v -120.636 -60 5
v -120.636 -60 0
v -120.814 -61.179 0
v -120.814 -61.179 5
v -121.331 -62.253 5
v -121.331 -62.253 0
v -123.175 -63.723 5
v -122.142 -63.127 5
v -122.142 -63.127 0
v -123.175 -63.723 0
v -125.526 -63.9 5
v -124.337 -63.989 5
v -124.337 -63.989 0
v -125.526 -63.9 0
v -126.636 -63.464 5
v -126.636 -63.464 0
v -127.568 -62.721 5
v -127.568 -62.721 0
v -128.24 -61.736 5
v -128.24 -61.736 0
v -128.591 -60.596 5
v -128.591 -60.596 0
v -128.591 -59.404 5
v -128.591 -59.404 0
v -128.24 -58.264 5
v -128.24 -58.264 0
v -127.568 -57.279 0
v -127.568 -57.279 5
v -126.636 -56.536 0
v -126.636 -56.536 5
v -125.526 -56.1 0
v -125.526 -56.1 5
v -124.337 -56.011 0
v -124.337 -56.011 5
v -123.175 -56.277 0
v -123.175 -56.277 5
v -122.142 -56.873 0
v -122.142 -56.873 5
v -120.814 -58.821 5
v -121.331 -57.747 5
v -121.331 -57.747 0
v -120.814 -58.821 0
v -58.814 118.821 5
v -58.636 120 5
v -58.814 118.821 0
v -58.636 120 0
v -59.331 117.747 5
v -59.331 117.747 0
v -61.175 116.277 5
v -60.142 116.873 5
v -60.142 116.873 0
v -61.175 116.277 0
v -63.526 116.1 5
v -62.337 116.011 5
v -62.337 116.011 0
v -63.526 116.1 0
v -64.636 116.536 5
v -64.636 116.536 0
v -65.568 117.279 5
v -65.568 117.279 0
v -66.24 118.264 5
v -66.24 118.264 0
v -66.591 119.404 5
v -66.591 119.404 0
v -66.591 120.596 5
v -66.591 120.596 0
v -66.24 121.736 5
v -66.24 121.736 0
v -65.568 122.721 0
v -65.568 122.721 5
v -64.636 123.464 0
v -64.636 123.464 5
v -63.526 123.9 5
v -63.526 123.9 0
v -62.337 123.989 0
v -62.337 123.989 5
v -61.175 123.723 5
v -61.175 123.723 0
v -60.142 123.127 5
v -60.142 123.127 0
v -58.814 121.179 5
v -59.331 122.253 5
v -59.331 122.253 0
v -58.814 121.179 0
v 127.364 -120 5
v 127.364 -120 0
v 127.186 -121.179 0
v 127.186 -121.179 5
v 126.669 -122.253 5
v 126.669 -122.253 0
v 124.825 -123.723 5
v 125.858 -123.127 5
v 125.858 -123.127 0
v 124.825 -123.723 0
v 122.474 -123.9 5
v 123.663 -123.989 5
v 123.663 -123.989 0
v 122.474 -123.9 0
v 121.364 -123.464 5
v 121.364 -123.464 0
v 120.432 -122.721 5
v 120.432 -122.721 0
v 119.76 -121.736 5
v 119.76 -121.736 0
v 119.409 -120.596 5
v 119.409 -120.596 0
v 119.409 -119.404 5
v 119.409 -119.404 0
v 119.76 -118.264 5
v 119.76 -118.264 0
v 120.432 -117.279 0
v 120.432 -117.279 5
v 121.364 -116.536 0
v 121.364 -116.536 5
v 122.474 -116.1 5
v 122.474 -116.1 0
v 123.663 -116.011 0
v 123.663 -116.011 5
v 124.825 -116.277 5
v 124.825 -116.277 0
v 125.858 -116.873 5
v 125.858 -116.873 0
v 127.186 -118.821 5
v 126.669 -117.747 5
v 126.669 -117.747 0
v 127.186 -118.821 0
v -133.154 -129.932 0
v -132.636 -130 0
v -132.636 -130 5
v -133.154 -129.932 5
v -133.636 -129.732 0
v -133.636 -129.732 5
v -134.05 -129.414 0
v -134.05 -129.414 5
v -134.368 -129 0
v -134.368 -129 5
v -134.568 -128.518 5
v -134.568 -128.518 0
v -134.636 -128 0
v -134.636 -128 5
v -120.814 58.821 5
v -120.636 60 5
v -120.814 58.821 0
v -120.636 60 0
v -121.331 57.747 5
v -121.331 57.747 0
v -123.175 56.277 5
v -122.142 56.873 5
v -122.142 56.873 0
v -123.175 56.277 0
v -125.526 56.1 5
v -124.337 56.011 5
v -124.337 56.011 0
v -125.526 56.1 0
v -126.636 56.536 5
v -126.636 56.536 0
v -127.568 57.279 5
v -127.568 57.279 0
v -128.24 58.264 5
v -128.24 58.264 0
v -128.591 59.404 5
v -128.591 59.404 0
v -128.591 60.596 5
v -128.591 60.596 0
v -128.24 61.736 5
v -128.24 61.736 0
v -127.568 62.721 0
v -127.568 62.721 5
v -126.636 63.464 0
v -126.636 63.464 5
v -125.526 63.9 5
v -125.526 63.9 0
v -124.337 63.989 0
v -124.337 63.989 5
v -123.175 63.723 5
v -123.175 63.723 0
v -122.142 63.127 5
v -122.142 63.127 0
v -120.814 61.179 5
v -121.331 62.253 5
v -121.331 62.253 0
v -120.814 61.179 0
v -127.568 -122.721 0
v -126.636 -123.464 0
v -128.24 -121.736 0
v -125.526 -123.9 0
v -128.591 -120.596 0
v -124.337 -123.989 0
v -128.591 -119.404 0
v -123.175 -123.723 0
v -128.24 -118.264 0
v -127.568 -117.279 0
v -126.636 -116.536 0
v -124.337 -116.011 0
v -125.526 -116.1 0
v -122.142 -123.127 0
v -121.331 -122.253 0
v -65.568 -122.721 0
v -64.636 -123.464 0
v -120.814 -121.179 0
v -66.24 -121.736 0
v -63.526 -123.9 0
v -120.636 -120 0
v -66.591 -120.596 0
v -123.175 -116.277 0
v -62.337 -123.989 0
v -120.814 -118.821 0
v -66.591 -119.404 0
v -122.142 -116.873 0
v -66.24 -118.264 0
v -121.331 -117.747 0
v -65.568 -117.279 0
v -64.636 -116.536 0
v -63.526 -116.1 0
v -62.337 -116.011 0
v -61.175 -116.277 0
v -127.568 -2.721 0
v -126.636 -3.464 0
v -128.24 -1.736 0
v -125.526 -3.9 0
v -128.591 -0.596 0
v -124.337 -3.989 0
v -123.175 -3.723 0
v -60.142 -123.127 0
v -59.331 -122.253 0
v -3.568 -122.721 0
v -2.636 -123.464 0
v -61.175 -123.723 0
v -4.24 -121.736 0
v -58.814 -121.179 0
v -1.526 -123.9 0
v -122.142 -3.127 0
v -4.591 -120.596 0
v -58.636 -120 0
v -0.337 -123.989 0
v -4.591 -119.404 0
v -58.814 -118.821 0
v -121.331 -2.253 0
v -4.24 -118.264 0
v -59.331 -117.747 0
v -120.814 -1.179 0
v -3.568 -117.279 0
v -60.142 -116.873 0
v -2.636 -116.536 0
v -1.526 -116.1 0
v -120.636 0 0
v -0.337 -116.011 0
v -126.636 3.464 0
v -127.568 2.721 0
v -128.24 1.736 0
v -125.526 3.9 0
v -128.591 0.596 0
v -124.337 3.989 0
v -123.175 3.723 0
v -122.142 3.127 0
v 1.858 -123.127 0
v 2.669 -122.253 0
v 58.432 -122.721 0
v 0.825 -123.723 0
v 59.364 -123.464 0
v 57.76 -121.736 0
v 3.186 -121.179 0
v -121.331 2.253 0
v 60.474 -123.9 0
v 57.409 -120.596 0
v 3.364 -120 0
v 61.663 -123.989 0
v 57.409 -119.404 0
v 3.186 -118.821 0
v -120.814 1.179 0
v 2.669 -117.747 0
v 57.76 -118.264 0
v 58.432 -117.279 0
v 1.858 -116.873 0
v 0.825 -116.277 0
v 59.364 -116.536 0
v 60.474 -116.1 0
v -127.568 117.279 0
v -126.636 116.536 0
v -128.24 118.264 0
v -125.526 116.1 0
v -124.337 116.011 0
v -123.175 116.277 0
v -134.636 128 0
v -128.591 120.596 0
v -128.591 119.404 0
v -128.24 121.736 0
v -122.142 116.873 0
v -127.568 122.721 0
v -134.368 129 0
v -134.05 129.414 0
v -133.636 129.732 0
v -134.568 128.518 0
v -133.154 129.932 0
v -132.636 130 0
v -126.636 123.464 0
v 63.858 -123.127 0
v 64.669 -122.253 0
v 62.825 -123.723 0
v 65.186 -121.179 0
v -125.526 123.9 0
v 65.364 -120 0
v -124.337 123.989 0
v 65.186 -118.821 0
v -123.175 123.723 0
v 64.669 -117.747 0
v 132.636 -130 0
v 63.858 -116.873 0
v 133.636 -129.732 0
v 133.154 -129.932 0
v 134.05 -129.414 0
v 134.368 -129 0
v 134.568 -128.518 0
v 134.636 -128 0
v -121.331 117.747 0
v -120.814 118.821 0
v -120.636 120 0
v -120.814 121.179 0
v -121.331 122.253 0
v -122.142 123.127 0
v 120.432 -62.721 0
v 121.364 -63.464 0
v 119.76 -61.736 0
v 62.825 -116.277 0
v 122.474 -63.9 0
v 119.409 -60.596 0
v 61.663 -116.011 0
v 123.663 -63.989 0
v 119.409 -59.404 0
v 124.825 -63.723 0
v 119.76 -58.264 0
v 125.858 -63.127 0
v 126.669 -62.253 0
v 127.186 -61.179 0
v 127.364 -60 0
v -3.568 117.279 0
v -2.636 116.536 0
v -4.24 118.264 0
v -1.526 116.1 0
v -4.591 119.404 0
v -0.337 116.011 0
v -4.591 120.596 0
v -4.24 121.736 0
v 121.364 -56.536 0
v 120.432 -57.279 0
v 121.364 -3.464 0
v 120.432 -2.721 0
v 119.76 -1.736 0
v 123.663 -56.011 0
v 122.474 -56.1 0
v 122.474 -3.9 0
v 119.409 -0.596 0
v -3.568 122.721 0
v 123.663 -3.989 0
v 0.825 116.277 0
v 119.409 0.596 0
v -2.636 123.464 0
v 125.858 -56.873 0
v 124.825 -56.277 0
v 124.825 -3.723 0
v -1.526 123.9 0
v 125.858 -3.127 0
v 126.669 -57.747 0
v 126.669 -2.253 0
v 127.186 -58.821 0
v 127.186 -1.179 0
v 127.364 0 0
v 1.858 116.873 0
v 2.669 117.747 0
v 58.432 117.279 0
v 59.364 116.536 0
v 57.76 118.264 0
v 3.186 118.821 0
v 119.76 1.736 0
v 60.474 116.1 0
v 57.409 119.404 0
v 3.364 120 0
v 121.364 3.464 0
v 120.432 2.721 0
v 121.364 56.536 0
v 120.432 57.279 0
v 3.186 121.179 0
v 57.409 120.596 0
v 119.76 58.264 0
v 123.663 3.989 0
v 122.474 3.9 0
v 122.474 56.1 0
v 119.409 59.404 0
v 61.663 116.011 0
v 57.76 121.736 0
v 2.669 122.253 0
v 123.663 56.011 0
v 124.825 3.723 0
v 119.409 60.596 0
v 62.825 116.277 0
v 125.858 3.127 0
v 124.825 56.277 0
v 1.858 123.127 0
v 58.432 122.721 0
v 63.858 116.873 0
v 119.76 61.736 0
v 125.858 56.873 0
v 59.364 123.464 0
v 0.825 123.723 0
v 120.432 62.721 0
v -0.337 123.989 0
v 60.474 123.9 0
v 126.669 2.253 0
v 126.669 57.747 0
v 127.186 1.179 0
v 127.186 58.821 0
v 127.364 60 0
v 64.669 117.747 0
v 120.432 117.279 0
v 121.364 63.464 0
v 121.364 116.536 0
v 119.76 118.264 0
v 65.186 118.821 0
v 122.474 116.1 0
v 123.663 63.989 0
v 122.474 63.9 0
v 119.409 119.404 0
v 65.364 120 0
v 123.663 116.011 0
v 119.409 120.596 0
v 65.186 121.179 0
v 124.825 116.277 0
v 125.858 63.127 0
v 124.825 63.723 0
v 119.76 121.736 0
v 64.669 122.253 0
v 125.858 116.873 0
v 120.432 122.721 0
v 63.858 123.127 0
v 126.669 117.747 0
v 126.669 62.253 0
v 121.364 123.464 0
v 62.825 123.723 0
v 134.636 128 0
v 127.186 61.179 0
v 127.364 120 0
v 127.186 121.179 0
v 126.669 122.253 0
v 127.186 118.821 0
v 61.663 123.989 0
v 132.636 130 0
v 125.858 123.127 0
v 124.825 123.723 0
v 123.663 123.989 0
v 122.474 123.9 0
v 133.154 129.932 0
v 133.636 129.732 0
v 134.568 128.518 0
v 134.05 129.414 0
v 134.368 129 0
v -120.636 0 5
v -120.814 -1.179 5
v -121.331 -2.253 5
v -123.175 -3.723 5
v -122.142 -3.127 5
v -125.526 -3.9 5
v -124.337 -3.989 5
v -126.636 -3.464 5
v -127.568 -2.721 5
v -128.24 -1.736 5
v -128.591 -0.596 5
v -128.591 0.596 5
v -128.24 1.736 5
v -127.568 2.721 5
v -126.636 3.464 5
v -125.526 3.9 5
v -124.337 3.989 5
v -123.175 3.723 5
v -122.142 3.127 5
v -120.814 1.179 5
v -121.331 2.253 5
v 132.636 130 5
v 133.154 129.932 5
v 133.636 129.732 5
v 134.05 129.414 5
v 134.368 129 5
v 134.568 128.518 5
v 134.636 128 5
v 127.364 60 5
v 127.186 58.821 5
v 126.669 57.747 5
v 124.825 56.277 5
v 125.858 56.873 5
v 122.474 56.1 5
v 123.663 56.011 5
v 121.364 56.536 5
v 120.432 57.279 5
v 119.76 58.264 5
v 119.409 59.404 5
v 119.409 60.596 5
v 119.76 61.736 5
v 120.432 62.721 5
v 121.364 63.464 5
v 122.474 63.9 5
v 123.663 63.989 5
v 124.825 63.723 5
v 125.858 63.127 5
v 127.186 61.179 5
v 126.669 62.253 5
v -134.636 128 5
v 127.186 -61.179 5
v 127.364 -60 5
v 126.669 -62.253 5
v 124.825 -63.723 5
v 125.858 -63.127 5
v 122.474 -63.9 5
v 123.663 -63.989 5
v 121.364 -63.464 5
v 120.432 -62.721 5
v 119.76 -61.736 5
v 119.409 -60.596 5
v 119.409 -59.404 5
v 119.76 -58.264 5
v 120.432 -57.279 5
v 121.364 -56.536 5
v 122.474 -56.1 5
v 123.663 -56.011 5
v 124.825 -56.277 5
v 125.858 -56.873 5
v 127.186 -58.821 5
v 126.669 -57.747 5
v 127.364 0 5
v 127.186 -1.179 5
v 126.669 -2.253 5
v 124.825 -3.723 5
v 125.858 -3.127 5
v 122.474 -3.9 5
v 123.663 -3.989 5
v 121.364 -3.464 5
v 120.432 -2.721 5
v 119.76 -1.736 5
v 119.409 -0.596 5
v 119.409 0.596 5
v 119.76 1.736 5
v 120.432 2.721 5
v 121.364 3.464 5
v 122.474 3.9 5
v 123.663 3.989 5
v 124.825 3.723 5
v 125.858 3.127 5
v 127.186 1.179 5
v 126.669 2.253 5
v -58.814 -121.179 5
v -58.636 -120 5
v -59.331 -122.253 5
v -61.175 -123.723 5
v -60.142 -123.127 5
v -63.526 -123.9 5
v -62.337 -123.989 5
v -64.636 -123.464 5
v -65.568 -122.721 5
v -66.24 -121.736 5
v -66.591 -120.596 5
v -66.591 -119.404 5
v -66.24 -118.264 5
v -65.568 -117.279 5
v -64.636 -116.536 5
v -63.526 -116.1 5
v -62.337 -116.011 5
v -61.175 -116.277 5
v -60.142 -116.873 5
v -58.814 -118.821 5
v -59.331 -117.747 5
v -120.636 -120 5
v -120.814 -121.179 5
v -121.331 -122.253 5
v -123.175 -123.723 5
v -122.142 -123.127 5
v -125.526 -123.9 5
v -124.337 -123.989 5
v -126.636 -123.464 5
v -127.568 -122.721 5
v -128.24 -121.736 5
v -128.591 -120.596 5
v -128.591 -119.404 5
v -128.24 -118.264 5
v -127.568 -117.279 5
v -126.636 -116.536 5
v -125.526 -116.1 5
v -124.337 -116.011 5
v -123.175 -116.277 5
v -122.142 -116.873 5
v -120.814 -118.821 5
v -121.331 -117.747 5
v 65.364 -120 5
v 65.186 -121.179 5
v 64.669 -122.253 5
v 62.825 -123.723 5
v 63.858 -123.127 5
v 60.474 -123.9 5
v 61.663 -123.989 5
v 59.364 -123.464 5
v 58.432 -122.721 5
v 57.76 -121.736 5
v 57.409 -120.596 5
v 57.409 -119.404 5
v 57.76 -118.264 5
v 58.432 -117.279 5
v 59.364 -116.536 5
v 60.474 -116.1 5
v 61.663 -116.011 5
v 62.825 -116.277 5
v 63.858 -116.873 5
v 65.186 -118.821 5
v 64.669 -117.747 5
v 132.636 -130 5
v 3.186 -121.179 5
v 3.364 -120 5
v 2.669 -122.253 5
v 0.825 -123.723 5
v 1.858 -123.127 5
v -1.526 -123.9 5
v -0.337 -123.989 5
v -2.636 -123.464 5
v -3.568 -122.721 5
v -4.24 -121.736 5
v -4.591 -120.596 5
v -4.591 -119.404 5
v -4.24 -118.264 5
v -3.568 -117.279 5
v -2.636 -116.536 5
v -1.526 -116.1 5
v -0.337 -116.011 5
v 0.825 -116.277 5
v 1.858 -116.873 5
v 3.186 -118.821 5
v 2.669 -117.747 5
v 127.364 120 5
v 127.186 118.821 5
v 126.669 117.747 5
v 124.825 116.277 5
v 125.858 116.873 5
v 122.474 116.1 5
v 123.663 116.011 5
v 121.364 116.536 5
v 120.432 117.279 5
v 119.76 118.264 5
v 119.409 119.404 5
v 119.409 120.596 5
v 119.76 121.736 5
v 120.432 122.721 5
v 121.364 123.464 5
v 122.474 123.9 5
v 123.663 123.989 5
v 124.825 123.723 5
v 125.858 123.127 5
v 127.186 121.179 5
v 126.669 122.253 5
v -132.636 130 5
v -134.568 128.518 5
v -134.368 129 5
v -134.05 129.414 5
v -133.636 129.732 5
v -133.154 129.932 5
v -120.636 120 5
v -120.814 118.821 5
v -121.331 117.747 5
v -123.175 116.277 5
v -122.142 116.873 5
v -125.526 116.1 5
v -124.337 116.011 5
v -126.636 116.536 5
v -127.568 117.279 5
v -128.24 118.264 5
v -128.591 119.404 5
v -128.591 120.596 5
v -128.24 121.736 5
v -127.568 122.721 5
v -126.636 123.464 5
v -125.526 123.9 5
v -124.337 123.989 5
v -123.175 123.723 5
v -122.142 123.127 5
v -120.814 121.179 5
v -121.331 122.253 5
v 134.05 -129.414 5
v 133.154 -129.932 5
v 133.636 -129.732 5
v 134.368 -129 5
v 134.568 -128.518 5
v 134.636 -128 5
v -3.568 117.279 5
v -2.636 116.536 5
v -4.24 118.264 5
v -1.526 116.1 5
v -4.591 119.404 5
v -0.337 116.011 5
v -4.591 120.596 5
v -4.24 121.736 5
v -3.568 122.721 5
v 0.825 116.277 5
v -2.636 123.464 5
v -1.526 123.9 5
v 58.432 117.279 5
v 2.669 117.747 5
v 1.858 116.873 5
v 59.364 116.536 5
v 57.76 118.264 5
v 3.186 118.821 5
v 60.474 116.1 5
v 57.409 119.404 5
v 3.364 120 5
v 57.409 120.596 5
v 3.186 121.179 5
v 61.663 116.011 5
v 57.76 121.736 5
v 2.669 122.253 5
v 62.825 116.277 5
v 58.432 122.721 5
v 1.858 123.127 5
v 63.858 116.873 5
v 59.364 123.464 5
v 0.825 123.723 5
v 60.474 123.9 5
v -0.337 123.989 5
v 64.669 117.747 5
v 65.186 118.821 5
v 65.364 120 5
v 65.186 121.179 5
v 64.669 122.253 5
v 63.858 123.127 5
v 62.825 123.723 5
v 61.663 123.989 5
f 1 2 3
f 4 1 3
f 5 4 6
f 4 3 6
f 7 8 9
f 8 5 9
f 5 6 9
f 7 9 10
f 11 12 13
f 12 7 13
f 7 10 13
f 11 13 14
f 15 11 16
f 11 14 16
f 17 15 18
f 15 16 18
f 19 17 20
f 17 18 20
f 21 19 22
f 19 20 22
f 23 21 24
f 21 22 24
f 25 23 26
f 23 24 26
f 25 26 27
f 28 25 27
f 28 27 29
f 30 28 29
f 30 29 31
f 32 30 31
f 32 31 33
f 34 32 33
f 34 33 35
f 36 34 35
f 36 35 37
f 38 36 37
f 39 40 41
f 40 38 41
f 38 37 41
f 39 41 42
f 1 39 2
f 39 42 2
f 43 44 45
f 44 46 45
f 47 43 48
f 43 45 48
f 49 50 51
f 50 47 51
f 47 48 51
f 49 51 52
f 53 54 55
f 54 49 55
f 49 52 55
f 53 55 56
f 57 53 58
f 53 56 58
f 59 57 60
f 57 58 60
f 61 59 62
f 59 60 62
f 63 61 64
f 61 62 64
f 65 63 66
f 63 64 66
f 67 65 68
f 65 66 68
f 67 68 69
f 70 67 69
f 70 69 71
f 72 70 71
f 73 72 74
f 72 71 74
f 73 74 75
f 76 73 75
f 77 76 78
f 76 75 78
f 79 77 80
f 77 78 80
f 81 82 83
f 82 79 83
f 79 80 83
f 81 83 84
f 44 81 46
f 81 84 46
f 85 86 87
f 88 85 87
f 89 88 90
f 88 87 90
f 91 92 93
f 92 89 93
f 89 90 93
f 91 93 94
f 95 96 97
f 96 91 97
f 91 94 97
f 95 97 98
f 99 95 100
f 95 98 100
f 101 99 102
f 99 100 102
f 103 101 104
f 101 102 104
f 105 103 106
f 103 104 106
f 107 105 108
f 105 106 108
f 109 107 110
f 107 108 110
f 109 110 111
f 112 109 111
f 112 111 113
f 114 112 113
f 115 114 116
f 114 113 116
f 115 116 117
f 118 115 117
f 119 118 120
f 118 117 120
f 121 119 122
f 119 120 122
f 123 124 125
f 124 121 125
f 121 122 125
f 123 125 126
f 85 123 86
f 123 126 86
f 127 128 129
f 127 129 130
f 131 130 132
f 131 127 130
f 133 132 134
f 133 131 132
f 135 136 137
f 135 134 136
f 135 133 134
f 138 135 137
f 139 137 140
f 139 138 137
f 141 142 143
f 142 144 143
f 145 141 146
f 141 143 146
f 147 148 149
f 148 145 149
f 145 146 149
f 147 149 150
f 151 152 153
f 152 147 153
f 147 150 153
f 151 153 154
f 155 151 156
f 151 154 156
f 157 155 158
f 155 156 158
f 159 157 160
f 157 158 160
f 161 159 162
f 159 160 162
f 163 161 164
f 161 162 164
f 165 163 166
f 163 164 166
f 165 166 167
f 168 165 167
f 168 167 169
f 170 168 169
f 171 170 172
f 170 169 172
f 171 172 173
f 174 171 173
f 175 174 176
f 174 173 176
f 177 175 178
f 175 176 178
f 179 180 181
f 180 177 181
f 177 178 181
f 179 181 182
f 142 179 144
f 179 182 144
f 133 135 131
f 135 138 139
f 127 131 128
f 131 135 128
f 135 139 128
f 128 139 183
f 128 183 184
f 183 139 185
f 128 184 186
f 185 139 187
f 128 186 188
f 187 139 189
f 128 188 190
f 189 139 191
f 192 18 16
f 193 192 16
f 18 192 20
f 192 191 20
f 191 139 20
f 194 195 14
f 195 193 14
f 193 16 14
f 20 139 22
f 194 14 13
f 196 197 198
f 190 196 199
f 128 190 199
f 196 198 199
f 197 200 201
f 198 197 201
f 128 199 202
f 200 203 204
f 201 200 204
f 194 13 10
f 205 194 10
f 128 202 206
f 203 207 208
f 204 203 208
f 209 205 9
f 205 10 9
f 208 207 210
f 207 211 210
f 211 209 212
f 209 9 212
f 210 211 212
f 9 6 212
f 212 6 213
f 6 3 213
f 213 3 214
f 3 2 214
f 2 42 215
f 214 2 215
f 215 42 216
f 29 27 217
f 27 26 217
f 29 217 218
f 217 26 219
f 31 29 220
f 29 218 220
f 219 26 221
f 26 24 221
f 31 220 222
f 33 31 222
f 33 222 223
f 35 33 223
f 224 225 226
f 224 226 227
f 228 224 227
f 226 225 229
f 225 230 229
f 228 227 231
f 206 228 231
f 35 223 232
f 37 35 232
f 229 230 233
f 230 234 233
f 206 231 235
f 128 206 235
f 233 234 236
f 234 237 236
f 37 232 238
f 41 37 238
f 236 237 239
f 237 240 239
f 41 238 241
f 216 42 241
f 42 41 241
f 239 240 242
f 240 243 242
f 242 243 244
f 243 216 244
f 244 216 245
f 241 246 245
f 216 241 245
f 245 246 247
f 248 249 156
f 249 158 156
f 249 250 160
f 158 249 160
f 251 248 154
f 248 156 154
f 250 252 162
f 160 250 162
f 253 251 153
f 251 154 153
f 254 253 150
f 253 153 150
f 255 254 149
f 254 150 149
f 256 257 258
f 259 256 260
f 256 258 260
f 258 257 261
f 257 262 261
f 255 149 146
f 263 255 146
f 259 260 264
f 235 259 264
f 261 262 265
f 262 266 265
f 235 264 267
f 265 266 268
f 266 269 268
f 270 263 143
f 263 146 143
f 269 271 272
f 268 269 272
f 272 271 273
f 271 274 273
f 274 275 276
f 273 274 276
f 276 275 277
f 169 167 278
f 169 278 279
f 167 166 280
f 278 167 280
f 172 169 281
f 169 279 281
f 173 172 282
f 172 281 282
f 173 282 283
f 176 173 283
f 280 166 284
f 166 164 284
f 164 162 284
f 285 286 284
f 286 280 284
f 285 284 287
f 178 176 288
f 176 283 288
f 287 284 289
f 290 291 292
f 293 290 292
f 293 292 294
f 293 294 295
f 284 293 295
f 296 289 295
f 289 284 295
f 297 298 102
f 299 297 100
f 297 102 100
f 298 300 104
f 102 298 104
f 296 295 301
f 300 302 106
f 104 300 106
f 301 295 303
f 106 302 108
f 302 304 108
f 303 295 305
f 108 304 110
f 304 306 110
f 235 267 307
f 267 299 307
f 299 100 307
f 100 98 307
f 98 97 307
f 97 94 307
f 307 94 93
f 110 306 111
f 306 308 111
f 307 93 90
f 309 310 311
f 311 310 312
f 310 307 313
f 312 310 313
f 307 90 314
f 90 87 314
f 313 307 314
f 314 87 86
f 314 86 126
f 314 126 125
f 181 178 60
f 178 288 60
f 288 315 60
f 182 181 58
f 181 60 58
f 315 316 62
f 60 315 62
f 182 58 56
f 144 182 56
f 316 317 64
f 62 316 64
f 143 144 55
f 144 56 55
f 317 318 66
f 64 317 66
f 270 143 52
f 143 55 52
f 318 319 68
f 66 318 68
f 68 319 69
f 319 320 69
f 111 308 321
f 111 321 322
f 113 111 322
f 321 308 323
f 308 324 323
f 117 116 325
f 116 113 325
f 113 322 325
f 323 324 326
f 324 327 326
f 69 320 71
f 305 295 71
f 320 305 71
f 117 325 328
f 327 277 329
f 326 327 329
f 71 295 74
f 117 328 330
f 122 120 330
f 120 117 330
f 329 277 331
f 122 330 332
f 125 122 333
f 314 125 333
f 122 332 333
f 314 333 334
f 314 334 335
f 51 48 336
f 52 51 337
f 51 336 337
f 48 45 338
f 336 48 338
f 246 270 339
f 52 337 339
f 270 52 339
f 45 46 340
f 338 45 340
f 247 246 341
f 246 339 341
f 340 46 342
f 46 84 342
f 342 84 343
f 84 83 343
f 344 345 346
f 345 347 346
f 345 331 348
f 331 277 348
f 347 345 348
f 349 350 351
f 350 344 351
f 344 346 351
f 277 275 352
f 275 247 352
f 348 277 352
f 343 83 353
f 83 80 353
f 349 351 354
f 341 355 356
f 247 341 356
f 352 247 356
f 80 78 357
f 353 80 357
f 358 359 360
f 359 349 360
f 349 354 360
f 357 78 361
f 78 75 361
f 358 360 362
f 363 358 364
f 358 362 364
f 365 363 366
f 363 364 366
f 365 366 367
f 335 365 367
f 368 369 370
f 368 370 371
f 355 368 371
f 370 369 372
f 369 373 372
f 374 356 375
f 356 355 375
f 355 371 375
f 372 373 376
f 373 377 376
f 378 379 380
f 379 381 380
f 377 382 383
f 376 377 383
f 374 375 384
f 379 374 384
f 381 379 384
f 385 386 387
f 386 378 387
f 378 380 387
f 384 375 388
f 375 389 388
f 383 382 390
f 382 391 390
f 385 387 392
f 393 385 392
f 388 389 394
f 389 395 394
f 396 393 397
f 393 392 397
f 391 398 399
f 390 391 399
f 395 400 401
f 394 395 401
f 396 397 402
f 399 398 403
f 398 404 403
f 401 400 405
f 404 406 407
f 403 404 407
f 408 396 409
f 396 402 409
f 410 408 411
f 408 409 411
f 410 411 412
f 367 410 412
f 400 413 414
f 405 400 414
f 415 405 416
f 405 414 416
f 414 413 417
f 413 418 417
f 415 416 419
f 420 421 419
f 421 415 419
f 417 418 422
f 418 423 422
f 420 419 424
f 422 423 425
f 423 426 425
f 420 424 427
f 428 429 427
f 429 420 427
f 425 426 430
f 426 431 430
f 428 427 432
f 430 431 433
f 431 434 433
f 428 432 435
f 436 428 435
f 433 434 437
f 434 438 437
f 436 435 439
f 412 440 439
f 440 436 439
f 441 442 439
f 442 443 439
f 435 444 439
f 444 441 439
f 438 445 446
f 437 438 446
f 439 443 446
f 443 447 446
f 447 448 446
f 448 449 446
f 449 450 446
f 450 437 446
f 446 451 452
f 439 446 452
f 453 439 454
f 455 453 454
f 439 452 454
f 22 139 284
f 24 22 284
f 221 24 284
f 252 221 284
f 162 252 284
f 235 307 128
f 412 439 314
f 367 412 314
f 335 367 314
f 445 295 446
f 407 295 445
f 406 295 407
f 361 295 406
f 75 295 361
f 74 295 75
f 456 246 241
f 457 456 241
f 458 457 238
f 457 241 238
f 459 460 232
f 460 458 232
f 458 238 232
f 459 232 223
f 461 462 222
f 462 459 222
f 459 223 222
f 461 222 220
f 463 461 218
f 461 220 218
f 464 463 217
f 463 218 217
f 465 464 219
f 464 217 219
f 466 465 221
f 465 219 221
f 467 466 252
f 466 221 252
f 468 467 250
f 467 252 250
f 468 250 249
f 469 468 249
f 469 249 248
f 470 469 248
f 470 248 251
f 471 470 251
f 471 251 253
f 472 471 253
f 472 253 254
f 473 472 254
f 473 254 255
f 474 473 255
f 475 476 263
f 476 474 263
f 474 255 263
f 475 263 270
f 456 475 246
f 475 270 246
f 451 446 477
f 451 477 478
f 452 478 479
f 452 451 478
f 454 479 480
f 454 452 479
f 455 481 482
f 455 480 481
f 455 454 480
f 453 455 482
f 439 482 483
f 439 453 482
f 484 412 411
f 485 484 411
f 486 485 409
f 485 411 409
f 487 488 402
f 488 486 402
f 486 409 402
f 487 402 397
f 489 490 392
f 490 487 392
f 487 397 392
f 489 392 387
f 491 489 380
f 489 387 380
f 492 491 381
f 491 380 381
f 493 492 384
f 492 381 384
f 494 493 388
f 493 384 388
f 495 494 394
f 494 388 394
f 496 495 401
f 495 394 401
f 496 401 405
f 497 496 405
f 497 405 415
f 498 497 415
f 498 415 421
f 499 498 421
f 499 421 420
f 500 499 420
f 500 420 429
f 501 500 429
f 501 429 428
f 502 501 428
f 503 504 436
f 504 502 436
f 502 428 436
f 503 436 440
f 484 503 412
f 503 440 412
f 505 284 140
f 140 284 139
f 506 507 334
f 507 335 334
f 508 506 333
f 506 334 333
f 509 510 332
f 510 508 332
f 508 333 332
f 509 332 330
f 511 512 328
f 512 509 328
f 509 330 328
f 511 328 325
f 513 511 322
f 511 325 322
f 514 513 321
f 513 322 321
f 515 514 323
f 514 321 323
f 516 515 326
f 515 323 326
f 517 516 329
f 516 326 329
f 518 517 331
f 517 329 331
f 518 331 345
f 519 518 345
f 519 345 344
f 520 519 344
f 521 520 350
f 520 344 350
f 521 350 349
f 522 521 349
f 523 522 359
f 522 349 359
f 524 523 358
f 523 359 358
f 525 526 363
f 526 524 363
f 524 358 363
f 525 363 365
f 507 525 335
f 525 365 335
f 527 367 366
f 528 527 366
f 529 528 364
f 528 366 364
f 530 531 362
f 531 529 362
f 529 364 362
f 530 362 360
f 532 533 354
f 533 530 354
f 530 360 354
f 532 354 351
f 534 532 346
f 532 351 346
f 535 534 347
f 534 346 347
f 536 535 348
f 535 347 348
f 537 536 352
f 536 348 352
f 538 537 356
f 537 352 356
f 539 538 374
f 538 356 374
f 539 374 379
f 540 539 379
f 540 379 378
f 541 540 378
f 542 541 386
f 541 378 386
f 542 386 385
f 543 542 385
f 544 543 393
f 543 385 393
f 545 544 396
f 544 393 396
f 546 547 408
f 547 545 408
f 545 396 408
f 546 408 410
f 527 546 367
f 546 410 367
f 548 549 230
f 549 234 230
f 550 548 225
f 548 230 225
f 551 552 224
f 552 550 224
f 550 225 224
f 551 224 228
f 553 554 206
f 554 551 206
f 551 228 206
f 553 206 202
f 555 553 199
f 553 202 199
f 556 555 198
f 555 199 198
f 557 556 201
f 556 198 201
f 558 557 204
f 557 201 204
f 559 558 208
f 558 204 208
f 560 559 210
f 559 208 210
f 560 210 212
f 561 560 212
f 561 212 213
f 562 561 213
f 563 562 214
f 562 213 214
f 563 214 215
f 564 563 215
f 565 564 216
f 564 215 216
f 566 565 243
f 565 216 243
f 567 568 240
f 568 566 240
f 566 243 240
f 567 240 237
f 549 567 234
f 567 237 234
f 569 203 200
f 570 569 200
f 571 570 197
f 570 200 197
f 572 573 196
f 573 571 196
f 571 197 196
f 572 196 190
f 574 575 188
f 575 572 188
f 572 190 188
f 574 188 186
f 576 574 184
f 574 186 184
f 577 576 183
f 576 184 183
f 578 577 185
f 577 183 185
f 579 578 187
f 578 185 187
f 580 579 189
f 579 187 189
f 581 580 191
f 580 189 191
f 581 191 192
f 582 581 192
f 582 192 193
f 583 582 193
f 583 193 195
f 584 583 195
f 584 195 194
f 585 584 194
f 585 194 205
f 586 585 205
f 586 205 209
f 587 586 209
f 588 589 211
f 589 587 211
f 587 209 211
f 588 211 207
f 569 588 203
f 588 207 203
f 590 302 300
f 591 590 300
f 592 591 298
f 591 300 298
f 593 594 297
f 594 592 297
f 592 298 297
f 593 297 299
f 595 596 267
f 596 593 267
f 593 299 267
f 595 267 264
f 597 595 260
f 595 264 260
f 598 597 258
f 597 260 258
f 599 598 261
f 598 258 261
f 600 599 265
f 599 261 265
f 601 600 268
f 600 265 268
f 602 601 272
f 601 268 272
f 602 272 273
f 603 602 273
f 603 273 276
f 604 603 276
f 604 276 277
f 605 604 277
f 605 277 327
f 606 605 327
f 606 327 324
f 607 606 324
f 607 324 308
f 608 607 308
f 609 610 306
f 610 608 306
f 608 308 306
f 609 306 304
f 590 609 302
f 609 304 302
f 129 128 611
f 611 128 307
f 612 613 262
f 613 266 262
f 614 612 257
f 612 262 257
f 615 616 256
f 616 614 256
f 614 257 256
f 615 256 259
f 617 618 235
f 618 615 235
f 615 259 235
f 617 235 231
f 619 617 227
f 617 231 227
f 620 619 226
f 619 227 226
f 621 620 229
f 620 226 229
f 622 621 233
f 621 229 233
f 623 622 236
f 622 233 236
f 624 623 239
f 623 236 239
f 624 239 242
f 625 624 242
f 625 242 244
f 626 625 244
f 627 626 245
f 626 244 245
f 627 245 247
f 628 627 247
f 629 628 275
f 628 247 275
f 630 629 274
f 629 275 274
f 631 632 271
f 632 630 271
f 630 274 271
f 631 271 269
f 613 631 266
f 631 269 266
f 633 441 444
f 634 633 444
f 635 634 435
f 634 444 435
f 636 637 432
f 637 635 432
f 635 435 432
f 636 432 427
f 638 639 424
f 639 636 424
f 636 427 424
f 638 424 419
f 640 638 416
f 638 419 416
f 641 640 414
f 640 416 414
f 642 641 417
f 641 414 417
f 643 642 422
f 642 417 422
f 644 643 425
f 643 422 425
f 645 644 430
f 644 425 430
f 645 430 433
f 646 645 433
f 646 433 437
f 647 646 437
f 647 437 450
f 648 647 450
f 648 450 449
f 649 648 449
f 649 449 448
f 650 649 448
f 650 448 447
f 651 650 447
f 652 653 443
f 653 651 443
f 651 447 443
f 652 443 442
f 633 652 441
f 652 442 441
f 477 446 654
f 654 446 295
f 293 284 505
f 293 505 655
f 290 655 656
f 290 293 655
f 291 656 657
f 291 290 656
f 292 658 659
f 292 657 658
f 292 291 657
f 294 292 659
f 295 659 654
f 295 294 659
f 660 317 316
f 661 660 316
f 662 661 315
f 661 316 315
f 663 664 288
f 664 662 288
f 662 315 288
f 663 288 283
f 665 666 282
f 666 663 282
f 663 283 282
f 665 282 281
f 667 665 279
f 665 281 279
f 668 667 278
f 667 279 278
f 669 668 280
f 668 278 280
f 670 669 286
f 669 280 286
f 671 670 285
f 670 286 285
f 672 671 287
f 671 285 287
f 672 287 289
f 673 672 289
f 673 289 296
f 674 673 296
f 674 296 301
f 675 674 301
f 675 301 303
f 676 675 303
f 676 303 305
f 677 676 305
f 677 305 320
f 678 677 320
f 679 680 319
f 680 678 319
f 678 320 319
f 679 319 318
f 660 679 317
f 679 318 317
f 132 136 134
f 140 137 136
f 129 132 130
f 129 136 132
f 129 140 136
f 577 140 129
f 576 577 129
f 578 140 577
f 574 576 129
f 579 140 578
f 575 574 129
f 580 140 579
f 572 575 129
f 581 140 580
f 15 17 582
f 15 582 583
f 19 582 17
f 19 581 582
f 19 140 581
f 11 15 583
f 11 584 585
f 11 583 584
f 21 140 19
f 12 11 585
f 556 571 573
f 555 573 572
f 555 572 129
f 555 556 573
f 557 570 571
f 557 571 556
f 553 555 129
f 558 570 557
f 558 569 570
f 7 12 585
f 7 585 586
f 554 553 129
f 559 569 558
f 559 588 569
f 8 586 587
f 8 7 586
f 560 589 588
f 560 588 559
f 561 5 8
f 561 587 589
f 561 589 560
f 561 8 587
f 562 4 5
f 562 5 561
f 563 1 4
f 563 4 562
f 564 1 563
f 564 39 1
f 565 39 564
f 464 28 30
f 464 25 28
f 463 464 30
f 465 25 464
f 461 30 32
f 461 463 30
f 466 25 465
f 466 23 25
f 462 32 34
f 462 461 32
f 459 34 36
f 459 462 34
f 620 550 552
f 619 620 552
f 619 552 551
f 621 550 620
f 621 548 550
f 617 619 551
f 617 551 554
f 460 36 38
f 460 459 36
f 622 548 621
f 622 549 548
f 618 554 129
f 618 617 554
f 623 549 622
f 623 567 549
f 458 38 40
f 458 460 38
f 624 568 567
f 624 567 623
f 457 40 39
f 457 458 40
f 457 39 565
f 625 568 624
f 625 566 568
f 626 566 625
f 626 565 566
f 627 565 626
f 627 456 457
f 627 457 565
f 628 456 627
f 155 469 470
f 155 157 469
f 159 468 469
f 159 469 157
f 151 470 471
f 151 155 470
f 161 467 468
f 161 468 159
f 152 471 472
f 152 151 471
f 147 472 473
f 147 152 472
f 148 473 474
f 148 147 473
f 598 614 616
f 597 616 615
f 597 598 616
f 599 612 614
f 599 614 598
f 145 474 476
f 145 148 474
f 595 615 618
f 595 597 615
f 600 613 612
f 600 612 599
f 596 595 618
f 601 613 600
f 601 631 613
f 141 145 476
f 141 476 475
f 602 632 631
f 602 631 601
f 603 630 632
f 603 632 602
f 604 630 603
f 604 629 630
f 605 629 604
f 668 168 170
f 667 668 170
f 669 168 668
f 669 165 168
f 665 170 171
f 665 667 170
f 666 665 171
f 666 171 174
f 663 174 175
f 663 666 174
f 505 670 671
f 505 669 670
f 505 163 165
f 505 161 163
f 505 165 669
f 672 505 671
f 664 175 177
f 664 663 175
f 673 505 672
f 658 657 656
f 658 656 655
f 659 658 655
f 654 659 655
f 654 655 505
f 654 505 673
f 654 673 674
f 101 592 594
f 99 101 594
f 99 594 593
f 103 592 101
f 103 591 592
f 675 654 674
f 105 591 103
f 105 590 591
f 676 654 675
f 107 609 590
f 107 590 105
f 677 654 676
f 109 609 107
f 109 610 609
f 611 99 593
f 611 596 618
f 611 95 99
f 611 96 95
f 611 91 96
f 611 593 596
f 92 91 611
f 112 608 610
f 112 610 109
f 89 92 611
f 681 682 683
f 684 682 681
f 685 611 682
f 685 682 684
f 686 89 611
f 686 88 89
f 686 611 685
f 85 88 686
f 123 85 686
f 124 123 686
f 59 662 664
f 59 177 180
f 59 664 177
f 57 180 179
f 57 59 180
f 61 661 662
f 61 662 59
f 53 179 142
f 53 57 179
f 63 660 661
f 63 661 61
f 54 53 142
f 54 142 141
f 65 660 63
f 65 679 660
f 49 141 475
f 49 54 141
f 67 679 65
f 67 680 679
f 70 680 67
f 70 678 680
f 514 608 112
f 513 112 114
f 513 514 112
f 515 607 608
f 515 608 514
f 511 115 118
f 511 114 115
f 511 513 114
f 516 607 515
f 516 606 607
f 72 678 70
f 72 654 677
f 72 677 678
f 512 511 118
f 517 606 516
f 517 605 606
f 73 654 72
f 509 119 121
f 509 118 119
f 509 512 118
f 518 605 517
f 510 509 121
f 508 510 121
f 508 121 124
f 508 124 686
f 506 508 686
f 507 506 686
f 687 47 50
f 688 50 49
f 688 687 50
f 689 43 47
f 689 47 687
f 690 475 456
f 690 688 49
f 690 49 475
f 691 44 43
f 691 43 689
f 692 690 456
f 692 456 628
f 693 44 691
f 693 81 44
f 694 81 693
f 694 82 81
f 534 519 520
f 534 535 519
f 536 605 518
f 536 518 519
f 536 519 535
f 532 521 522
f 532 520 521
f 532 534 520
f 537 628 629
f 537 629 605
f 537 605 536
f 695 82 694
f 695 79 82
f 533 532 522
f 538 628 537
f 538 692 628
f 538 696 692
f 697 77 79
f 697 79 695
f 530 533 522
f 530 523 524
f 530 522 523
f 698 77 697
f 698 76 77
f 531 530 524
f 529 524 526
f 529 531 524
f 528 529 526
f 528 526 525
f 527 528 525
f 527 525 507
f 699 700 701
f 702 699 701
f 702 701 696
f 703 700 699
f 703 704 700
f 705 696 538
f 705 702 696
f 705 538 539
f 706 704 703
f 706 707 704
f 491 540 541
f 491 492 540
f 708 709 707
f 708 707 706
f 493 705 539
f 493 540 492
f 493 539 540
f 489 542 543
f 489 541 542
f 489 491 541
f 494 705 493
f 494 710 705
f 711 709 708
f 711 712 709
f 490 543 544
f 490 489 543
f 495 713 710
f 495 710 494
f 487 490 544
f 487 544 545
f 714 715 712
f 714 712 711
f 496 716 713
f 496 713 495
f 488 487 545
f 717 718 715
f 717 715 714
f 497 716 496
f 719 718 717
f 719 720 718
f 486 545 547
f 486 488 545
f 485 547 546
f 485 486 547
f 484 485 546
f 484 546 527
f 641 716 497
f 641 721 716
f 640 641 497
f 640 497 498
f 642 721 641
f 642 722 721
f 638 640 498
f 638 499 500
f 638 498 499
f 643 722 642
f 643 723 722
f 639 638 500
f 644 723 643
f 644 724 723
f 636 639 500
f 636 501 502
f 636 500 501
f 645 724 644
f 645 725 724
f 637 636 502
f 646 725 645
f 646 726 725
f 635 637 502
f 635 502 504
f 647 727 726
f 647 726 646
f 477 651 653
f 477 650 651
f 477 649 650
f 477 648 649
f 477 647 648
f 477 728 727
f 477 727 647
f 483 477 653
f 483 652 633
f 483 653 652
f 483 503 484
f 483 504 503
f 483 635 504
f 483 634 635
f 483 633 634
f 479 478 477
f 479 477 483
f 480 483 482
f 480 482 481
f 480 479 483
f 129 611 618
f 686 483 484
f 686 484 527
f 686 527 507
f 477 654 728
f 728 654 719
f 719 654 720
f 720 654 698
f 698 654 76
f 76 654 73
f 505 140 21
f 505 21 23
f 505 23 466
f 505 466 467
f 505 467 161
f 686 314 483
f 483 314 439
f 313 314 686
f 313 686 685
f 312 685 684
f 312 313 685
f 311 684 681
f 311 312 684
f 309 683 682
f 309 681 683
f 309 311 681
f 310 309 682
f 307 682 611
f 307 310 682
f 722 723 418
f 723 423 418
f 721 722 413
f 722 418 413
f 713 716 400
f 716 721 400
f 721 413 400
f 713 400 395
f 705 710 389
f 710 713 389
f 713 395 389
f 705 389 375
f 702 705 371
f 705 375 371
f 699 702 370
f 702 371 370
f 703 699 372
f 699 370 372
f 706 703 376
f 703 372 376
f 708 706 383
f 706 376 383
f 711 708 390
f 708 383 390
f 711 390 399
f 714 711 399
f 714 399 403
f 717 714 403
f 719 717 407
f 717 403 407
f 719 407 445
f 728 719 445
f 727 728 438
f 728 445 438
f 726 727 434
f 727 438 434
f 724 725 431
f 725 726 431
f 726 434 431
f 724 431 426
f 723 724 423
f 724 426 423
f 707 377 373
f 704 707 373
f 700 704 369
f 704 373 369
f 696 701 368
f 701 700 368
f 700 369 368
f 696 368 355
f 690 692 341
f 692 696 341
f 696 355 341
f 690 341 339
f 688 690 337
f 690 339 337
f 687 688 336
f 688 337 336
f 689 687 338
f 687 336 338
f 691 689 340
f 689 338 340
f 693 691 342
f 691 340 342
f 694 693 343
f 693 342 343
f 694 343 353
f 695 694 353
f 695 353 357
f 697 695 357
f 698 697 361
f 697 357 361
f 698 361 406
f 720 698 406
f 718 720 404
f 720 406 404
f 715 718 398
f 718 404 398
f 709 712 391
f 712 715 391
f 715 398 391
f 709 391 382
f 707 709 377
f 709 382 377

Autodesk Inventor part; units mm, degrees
ref_plane "YZ Plane" through (0, 0, 0) normal (1, 0, 0) x (0, 1, 0)
ref_plane "XZ Plane" through (0, 0, 0) normal (0, 1, 0) x (-1, 0, 0)
ref_plane "XY Plane" through (0, 0, 0) normal (0, 0, 1) x (1, 0, 0)
ref_plane "РабПлоскость1" through (0, 0, 0) normal (0, 0, 1) x (1, 0, 0)
sketch "Эскиз1" plane through (0, 0, 0) normal (0, 0, 1) x (1, 0, 0)
  line L0 (-134.636, 128) -> (-134.636, -128) projected
  arc A0 (-134.636, -128) -> (-132.636, -130) centre (-132.636, -128) ccw projected
  line L1 (-132.636, -130) -> (132.636, -130) projected
  arc A1 (132.636, -130) -> (134.636, -128) centre (132.636, -128) ccw projected
  line L2 (134.636, -128) -> (134.636, 128) projected
  arc A2 (134.636, 128) -> (132.636, 130) centre (132.636, 128) ccw projected
  line L3 (132.636, 130) -> (-132.636, 130) projected
  arc A3 (-132.636, 130) -> (-134.636, 128) centre (-132.636, 128) ccw projected
  circle A4 centre (-124.636, 120) radius 4 projected
  circle A5 centre (-0.636, 120) radius 4 projected
  circle A6 centre (123.364, 120) radius 4 projected
  circle A7 centre (123.364, 60) radius 4 projected
  circle A8 centre (123.364, 0) radius 4 projected
  circle A9 centre (-124.636, -60) radius 4 projected
  circle A10 centre (123.364, -60) radius 4 projected
  circle A11 centre (-124.636, -120) radius 4 projected
  circle A12 centre (-62.636, -120) radius 4 projected
  circle A13 centre (-0.636, -120) radius 4 projected
  circle A14 centre (61.364, -120) radius 4 projected
  circle A15 centre (123.364, -120) radius 4 projected
  circle A16 centre (-124.636, 0) radius 4 projected
  circle A17 centre (-124.636, 60) radius 4 projected
  circle A18 centre (61.364, 120) radius 4 projected
  circle A19 centre (-62.636, 120) radius 4 projected
  line L4 (115.364, 110) -> (115.364, -110) projected
  line L5 (115.364, -110) -> (-114.636, -110) projected
  line L6 (-114.636, -110) -> (-114.636, 110) projected
  line L7 (-114.636, 110) -> (115.364, 110) projected
  point P0 (0, 0)
extrude "Выдавливание1" add sketch "Эскиз1" along normal blind 5 contours A3 L3 A2 L2 A1 L1 A0 L0 | L4 L5 L6 L7
properties part number "Крышка водяной рубашки" material "Чугун, серый"
